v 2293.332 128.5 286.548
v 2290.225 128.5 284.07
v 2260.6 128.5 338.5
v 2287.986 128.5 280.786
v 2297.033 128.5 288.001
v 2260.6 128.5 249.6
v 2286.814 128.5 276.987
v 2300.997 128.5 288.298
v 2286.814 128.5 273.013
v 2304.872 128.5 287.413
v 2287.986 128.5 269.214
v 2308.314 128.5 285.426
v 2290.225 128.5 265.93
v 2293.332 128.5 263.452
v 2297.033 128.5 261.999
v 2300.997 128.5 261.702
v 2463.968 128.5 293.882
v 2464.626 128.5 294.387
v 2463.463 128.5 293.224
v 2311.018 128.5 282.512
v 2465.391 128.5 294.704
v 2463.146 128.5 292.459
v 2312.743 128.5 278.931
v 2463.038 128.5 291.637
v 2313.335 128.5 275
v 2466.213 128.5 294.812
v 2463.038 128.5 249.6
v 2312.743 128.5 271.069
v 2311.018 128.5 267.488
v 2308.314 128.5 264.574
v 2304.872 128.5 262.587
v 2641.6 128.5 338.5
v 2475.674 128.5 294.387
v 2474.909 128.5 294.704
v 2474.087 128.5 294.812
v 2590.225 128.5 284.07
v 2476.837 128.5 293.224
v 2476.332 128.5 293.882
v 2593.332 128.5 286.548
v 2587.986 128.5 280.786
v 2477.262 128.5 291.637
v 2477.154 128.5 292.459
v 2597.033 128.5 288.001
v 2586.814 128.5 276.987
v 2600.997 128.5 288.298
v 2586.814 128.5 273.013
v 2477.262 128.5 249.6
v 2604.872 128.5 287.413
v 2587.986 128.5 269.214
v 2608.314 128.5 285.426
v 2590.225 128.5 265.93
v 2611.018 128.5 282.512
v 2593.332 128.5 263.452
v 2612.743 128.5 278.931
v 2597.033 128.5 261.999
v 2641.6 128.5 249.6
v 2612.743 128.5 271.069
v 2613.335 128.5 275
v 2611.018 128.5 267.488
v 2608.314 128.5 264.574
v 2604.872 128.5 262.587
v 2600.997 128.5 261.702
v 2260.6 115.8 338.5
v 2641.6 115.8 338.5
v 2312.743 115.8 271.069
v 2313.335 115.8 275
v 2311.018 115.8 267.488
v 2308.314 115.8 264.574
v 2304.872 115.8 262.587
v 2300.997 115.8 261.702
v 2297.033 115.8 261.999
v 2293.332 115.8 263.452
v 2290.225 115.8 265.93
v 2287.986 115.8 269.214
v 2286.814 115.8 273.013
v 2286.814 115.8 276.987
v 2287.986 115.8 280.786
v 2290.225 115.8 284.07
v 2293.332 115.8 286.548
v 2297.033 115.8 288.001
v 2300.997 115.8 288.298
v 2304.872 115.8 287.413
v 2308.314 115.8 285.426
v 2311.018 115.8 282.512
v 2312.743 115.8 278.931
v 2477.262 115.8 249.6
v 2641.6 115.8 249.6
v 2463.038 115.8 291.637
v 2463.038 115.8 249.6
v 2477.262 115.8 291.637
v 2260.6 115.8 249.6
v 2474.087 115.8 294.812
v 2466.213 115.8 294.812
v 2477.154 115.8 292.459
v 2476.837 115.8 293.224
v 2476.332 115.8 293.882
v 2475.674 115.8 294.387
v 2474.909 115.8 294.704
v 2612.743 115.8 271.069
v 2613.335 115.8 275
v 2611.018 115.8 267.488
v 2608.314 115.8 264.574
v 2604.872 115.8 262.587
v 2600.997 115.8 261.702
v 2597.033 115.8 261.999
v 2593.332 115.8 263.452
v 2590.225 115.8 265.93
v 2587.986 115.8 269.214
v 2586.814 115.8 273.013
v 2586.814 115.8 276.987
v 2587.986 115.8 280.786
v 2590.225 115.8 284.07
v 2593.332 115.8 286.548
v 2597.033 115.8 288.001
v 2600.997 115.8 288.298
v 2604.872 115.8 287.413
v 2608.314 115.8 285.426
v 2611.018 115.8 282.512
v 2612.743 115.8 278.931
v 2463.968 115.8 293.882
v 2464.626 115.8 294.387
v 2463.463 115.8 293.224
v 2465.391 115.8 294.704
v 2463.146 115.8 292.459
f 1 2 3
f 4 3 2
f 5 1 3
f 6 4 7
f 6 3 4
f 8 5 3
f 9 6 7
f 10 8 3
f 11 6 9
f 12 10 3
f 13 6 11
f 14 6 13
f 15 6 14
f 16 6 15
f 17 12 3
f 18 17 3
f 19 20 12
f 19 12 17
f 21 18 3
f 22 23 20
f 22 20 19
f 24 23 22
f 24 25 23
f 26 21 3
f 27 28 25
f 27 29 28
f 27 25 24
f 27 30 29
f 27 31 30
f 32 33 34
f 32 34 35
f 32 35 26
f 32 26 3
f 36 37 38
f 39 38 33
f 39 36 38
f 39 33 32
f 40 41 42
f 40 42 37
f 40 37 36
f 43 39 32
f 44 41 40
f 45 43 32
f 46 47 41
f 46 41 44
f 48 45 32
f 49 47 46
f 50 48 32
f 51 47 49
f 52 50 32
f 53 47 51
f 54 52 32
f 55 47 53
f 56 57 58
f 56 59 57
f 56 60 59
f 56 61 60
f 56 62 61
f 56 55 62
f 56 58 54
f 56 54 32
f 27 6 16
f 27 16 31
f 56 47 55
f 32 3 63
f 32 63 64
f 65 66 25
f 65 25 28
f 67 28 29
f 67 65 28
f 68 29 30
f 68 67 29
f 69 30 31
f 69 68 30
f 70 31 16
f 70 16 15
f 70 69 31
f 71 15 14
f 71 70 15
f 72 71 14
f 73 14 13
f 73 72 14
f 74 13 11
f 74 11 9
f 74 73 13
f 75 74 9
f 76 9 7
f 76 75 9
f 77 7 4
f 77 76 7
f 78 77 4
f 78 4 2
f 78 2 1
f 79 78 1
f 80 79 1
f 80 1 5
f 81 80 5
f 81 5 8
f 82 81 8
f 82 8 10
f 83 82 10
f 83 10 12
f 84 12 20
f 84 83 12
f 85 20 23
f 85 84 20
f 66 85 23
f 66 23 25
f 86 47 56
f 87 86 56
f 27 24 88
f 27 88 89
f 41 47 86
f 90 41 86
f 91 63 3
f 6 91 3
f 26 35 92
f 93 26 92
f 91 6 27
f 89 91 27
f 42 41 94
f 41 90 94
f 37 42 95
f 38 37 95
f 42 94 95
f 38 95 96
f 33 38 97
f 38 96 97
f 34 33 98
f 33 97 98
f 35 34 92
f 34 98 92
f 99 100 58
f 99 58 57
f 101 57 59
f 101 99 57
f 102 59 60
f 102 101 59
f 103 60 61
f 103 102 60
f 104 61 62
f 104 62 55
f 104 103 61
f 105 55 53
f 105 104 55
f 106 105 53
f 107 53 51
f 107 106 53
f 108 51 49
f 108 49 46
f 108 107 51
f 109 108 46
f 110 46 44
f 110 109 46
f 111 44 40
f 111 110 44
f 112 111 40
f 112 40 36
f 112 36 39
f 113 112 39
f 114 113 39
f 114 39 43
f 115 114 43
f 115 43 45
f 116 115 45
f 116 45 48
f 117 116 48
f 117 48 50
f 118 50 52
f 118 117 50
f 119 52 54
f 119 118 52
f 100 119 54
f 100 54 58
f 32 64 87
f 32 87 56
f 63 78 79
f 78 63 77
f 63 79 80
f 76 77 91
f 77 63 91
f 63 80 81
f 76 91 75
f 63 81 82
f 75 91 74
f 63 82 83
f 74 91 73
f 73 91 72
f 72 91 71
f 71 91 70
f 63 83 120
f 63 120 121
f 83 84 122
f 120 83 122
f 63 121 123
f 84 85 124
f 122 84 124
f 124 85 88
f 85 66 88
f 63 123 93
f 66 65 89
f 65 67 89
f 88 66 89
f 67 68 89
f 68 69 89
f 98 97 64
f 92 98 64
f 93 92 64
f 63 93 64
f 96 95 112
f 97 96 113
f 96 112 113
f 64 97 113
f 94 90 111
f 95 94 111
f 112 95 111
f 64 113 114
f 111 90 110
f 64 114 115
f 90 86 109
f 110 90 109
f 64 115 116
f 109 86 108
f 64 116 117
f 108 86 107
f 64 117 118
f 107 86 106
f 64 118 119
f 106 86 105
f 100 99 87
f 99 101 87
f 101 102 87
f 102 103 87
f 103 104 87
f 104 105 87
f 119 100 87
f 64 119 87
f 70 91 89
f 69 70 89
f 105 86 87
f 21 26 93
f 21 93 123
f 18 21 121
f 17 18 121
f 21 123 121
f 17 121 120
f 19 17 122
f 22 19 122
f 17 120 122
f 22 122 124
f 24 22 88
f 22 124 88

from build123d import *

# Parameters (mm, degrees)
BOSS_EXTRUDE1_DEPTH      = 50.8
BOSS_EXTRUDE1_DEPTH_BACK = 38.1
SKETCH2_W                = 381
SKETCH2_H                = 12.7
SKETCH3_W                = 12.7
SKETCH3_H                = 44.45
CUT_EXTRUDE1_DEPTH       = 2664.230012597
CAVITY1_START            = 115.8
CAVITY1_OUTLINE_R        = 12.7
CAVITY1_DEPTH            = 12.7
MOVE_FACE_HOLES_BY       = 0.635
MOVE_FACE_HOLES_2_BY     = 0.635
MOVE_FACE_SLOTS_BY       = 0.762
MOVE_FACE_SLOTS_2_BY     = 0.762
MOVE_FACE_SLOTS_3_BY     = 0.762
SLOT_FILLET_R            = 3.175


# Read off the part's stored shape, not the designer's step: Cavity1
with BuildPart() as part:
    # Sketch2 → Boss-Extrude1 (new, two sides: drawn at the far end of the back side and taken through both)
    with BuildSketch(Plane.XY.offset(287.7).offset(-BOSS_EXTRUDE1_DEPTH_BACK)):
        with Locations((2451.1, 122.15)):
            Rectangle(SKETCH2_W, SKETCH2_H)
    extrude(amount=BOSS_EXTRUDE1_DEPTH + BOSS_EXTRUDE1_DEPTH_BACK)

    # Sketch3 → Cut-Extrude1 (cut, through all)
    with BuildSketch(Plane(origin=(0, 128.5, 0), x_dir=(1, 0, 0), z_dir=(0, 1, 0))):
        with Locations((2470.15, -271.825)):
            Rectangle(SKETCH3_W, SKETCH3_H)
    extrude(amount=-CUT_EXTRUDE1_DEPTH, mode=Mode.SUBTRACT)

    # Cavity1 outline → Cavity1 (cut)
    with BuildSketch(Plane(origin=(0, 0, 0), x_dir=(1, 0, 0), z_dir=(0, 1, 0)).offset(CAVITY1_START)):
        with Locations((2300, -275)):
            Circle(CAVITY1_OUTLINE_R)
        with Locations((2600, -275)):
            Circle(CAVITY1_OUTLINE_R)
    extrude(amount=CAVITY1_DEPTH, mode=Mode.SUBTRACT)

    # Move Face Holes: a curved face moved inward by 0.635
    add(Solid.thicken(part.faces().sort_by_distance((2587.3, 122.15, 275))[0], -MOVE_FACE_HOLES_BY), mode=Mode.SUBTRACT)

    # Move Face Holes 2: a curved face moved inward by 0.635
    add(Solid.thicken(part.faces().sort_by_distance((2287.3, 122.15, 275))[0], -MOVE_FACE_HOLES_2_BY), mode=Mode.SUBTRACT)

    # Move Face Slots: a face moved inward by 0.762
    extrude(part.faces().sort_by_distance((2463.8, 122.15, 271.825))[0], amount=MOVE_FACE_SLOTS_BY, dir=(-1, 0, 0), mode=Mode.SUBTRACT)

    # Move Face Slots 2: a face moved inward by 0.762
    extrude(part.faces().sort_by_distance((2470.15, 122.15, 294.05))[0], amount=MOVE_FACE_SLOTS_2_BY, dir=(0, 0, 1), mode=Mode.SUBTRACT)

    # Move Face Slots 3: a face moved inward by 0.762
    extrude(part.faces().sort_by_distance((2476.5, 122.15, 271.825))[0], amount=MOVE_FACE_SLOTS_3_BY, dir=(1, 0, 0), mode=Mode.SUBTRACT)

    # Slot Fillet
    slot_fillet_edges = [part.edges().sort_by_distance(p)[0] for p in [
        (2477.262, 122.15, 294.812),
        (2463.038, 122.15, 294.812),
    ]]
    fillet(slot_fillet_edges, radius=SLOT_FILLET_R)


solid = part.part
